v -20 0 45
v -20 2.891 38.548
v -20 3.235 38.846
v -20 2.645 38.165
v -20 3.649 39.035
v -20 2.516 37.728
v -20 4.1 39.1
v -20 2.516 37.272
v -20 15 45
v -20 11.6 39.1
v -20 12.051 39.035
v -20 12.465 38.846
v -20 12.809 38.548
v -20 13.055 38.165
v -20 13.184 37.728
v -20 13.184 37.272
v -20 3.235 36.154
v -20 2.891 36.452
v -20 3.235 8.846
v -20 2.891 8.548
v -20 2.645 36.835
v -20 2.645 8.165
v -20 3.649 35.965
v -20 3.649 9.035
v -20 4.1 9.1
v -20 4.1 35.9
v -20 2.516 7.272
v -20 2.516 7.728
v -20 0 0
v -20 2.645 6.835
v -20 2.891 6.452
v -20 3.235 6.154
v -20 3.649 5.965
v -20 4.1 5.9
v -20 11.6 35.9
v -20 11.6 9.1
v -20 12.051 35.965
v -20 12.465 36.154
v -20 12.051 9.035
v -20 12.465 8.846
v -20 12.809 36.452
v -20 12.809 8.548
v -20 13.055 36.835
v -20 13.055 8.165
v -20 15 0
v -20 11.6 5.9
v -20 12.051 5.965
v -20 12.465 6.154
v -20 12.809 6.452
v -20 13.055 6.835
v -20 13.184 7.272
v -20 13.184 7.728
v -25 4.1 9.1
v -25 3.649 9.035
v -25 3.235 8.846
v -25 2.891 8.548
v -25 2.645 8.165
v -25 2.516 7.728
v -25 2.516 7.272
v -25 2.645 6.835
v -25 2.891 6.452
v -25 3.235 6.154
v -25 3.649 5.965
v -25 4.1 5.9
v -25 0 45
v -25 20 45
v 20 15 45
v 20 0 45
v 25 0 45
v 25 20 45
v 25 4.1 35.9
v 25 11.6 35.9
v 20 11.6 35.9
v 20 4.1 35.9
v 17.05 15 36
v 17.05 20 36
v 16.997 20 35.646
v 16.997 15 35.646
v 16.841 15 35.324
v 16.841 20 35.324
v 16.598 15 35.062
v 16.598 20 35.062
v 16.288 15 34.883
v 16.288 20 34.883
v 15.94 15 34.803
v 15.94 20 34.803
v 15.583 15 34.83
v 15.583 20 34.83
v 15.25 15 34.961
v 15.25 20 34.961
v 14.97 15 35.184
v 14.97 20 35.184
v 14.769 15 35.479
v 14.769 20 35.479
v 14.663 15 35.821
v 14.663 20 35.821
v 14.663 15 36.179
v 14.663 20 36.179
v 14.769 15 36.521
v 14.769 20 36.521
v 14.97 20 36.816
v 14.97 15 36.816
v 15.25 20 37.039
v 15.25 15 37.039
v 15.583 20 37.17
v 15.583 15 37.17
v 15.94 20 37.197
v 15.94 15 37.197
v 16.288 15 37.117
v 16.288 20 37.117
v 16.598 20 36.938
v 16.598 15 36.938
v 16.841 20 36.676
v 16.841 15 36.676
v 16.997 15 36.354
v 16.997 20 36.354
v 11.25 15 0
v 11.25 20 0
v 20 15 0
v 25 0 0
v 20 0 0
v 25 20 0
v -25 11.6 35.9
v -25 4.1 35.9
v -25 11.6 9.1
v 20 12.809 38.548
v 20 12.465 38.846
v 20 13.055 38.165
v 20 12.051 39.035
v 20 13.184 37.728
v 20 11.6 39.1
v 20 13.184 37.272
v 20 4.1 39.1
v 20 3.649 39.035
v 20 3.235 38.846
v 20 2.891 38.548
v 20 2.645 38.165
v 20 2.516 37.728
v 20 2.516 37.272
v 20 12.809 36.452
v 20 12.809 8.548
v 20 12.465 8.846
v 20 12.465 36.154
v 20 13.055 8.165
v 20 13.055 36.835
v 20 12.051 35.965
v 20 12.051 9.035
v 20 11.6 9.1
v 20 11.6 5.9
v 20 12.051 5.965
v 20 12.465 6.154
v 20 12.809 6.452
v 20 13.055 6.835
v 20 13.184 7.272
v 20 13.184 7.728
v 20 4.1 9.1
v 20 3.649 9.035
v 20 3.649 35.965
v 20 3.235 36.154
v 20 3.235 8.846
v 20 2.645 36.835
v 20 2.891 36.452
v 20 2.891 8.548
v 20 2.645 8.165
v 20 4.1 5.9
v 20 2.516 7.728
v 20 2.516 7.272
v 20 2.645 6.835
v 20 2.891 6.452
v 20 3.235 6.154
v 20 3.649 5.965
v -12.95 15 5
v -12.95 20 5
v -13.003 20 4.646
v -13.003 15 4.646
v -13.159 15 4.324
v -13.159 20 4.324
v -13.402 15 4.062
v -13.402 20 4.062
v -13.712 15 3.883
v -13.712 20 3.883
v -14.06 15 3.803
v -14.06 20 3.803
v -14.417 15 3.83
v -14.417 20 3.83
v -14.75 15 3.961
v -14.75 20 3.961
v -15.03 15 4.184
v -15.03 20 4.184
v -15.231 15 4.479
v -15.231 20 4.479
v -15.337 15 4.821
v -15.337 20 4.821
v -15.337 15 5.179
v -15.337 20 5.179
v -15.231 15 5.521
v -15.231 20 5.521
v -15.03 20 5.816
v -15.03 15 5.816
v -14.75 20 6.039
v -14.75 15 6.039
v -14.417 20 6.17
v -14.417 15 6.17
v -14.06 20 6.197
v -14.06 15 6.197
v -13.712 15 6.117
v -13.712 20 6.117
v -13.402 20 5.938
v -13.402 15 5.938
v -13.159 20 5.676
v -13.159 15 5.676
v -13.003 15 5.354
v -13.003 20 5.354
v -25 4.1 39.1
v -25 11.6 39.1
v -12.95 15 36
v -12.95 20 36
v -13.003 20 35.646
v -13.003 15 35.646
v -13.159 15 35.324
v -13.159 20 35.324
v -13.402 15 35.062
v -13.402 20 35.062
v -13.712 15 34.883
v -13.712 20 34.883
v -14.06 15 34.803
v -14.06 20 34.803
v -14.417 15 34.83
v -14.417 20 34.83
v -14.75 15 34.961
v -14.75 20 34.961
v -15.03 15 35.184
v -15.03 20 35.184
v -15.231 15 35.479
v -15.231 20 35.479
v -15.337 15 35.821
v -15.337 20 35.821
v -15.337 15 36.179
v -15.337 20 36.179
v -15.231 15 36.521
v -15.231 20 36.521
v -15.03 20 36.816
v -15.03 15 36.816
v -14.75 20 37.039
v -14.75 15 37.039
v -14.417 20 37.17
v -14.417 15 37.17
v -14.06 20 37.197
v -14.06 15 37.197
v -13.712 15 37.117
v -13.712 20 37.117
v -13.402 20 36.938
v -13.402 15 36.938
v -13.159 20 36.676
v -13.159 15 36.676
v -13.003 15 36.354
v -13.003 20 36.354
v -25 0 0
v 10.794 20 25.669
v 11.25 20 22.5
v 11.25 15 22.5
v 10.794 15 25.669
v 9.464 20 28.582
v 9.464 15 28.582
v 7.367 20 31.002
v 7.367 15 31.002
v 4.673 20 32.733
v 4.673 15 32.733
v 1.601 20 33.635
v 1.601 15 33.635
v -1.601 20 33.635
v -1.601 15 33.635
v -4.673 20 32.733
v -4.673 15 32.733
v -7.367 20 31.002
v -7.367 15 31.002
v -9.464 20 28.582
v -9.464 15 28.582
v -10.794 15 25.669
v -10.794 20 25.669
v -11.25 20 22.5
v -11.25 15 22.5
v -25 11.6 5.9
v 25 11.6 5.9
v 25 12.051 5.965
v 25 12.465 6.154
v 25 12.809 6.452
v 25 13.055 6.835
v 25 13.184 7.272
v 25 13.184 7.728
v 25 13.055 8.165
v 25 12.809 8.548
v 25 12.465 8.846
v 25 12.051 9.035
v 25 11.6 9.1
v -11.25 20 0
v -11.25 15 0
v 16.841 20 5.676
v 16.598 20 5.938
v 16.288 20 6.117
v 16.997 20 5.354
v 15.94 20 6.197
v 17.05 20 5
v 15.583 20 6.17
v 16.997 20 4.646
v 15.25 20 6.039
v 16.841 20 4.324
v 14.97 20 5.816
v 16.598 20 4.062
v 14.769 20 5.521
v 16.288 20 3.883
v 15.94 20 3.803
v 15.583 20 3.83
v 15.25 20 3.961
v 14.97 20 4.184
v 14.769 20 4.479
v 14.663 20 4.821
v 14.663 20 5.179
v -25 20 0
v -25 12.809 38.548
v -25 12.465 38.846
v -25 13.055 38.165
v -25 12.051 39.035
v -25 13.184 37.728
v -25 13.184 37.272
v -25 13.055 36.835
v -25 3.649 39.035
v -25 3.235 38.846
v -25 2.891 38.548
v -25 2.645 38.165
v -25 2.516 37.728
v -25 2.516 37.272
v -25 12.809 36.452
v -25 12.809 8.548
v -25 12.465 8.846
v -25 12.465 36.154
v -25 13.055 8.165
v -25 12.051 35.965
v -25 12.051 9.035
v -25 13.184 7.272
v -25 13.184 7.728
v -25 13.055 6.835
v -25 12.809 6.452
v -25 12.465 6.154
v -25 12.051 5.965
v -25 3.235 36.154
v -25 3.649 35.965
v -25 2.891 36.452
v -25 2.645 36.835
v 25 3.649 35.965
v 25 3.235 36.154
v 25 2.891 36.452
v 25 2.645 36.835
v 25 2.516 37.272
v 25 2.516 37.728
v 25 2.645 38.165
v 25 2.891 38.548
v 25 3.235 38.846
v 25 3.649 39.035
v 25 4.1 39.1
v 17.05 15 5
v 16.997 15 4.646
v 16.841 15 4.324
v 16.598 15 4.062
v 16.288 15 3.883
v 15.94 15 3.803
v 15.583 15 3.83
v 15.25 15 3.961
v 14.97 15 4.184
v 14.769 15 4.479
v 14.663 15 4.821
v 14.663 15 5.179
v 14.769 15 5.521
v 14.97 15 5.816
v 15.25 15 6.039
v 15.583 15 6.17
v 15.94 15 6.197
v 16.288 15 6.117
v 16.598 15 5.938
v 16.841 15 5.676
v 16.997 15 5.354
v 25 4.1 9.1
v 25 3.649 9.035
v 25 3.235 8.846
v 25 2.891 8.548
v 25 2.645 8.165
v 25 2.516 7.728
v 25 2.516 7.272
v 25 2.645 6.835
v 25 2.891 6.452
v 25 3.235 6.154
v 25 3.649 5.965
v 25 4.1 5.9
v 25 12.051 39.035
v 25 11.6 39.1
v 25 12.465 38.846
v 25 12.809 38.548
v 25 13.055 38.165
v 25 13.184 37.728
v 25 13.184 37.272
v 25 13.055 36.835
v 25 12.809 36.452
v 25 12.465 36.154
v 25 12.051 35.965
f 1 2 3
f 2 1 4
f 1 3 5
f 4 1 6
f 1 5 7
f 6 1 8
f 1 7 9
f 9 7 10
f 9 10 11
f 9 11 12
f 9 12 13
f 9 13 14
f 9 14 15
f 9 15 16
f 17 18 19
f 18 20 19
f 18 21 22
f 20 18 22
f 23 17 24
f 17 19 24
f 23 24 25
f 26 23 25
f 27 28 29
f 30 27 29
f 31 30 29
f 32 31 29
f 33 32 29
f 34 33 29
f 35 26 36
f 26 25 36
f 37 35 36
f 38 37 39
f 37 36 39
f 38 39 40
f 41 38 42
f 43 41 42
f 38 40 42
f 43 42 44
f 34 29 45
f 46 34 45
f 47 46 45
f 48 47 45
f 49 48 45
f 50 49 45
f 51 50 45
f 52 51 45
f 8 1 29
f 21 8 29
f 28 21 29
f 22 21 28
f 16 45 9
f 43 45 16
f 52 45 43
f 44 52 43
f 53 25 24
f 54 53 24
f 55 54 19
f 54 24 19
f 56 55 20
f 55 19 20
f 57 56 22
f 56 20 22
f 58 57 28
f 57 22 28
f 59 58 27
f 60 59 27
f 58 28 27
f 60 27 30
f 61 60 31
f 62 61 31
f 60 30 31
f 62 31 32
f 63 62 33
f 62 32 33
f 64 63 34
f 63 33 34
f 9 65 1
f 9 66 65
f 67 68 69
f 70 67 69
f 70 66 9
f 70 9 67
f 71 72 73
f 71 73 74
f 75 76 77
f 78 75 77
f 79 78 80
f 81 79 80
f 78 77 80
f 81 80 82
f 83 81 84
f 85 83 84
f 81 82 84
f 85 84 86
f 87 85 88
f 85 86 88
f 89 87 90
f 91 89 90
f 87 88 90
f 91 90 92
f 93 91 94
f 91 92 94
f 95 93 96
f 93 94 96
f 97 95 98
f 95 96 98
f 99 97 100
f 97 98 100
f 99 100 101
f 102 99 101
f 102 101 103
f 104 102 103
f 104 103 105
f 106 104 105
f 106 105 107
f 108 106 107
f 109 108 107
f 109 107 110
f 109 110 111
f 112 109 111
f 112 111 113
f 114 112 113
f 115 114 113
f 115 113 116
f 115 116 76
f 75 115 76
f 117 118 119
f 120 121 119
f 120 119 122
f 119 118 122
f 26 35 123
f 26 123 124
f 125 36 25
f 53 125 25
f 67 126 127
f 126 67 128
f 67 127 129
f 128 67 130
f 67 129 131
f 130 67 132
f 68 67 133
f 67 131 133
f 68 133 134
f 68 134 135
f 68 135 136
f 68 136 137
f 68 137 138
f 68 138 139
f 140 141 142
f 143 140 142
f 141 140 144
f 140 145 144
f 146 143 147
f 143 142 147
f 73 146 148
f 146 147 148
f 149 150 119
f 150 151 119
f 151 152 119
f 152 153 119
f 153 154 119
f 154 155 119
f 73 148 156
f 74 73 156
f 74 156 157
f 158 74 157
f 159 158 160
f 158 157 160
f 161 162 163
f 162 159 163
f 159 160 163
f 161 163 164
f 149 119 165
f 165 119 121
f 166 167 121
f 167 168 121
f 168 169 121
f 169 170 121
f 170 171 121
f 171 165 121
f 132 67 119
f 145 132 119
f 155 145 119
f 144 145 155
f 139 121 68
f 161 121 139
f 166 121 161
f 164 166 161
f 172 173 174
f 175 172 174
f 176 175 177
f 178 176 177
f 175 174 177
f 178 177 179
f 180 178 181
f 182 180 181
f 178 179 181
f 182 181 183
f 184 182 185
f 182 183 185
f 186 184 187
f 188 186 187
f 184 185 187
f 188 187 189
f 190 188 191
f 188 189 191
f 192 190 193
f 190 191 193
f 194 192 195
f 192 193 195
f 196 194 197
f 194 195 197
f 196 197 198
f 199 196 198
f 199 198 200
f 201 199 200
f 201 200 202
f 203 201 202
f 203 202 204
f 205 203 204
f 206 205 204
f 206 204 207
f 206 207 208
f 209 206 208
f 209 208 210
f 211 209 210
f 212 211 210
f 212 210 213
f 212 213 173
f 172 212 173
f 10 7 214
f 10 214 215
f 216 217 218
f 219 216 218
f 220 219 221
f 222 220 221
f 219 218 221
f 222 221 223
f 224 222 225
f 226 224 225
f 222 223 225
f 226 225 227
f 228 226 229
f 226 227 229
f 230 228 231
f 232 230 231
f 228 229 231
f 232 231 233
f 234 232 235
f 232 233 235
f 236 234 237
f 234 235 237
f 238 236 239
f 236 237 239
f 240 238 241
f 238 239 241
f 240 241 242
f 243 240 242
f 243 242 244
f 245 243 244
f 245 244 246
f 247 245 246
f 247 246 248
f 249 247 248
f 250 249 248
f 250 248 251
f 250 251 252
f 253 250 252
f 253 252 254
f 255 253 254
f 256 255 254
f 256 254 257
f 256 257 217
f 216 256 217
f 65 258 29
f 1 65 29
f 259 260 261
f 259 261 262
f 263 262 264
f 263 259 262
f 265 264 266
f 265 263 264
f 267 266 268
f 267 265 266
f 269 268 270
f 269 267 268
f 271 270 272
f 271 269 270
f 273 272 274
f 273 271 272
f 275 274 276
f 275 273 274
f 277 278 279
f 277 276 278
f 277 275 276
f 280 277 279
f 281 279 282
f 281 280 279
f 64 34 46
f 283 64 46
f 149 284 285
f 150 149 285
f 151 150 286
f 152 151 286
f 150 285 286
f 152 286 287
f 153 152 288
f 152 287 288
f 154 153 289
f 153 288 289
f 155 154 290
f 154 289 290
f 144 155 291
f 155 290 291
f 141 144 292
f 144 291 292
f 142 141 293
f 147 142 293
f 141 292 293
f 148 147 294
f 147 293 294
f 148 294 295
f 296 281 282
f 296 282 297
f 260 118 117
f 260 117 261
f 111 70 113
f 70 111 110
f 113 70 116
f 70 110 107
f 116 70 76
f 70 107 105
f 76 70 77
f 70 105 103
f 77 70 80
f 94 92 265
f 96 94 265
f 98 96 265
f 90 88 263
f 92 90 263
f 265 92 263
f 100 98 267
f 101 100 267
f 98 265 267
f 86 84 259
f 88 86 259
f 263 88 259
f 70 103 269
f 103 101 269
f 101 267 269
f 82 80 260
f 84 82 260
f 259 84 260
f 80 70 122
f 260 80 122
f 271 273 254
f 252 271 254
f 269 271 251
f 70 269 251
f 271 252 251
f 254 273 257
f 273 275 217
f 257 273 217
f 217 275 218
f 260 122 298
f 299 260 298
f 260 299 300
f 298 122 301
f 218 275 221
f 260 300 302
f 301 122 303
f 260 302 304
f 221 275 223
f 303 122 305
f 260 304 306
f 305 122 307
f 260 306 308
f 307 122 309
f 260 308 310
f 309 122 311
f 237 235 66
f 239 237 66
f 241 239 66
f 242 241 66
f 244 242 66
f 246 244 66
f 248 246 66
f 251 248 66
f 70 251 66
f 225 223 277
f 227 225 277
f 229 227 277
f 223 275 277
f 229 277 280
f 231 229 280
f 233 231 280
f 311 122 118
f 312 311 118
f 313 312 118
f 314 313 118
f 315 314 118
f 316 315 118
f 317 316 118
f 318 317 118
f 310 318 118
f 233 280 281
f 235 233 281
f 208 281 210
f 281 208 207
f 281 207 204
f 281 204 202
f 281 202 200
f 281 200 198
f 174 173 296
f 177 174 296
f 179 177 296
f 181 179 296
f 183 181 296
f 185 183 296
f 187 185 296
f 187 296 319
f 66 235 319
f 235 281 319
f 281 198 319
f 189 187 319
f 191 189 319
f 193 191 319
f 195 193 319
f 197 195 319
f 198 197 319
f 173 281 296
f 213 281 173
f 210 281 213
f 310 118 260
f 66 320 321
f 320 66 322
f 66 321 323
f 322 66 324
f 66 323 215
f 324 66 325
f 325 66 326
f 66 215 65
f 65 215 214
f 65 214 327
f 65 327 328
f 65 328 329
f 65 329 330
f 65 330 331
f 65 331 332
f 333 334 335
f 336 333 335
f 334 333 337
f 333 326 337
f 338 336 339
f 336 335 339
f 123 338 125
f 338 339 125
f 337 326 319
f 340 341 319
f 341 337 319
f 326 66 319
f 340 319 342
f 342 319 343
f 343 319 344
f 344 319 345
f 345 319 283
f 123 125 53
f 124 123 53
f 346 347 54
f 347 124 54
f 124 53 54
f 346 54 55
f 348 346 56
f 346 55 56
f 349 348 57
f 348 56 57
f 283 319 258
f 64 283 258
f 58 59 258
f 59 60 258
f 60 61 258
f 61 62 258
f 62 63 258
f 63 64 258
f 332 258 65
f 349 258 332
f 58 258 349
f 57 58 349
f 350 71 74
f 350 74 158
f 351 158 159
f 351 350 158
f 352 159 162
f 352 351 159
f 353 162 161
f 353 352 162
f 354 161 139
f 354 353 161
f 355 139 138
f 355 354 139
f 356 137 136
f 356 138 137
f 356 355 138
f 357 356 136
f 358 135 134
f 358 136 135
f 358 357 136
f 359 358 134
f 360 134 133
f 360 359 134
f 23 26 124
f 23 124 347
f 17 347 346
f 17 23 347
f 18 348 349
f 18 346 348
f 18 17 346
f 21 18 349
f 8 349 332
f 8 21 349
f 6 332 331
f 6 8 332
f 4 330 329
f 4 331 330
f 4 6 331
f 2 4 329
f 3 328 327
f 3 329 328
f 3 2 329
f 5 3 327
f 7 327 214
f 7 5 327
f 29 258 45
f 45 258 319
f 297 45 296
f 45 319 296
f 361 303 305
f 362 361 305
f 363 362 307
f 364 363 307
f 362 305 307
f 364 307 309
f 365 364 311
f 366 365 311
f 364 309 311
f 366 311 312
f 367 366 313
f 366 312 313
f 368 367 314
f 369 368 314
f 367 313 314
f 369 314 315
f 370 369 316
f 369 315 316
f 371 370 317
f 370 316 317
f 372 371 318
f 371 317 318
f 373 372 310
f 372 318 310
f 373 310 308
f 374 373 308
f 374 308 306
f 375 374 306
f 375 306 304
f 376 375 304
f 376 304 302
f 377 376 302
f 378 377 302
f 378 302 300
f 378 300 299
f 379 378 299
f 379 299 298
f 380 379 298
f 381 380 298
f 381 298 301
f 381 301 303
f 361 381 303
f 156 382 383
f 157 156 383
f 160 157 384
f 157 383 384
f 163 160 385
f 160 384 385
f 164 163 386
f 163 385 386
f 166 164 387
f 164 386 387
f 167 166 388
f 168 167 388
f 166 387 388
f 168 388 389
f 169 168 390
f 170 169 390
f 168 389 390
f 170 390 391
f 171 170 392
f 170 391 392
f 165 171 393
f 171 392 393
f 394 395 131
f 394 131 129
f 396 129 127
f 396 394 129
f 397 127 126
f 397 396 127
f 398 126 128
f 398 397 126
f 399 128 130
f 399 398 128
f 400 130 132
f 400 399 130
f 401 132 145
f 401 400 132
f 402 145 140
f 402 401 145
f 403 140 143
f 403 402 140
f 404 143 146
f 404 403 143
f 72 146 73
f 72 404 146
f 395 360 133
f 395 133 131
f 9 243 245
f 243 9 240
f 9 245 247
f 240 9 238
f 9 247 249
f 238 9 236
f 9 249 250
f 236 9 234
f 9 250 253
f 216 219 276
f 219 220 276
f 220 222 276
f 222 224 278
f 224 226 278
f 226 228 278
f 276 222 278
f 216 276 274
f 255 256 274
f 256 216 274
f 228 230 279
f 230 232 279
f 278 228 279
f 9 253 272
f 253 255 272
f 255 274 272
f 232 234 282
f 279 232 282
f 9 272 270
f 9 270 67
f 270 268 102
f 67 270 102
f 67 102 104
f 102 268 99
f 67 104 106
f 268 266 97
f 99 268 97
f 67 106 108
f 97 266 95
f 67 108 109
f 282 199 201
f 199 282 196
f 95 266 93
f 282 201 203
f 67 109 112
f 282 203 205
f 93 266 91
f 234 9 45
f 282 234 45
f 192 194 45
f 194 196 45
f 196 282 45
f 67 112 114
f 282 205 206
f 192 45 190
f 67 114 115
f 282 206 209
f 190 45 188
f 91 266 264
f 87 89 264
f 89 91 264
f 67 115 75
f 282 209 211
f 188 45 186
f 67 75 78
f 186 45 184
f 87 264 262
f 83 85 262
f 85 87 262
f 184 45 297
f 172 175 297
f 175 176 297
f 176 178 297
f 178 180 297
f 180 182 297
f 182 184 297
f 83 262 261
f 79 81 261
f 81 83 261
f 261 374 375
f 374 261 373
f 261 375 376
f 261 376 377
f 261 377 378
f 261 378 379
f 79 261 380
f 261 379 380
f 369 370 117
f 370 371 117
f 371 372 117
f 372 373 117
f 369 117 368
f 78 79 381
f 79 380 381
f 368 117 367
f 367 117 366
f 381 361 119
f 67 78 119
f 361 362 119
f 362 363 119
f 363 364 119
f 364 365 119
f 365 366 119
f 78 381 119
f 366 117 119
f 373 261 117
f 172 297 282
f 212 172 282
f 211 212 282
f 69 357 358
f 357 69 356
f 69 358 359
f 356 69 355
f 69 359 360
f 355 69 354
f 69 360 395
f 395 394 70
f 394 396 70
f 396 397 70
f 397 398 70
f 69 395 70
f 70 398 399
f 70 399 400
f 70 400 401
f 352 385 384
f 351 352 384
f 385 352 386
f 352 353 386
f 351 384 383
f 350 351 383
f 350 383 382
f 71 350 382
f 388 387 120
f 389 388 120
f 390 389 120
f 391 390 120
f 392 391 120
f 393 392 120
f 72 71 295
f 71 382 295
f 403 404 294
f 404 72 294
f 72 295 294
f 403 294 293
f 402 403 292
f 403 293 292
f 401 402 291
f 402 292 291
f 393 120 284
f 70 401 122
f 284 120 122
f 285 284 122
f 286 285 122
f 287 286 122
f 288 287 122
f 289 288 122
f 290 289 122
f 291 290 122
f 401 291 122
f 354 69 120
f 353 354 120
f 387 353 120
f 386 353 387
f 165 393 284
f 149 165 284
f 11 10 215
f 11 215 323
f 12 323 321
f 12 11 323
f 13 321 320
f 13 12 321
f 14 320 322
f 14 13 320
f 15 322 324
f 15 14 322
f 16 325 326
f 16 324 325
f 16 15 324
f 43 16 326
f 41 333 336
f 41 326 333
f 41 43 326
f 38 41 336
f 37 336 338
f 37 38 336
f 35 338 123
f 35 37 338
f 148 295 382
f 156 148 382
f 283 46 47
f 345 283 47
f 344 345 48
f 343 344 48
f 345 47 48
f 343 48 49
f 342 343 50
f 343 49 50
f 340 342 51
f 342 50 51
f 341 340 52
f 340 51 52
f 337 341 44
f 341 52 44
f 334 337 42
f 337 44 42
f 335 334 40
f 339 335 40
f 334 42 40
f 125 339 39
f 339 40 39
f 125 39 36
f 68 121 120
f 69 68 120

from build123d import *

# Parameters (mm, degrees)
BOSS_EXTRUDE1_DEPTH     = 45
CUT_EXTRUDE1_REACH      = 22
SKETCH3_R               = 1.2
CUT_EXTRUDE2_DEPTH      = 10
CUT_EXTRUDE3_DEPTH      = 1
CUT_EXTRUDE3_DEPTH_BACK = 51


with BuildPart() as part:
    # Sketch1 → Boss-Extrude1 (new body)
    with BuildSketch(Plane.XY):
        Polygon((-25, 0), (-20, 0), (-20, 15), (20, 15), (20, 0), (25, 0), (25, 20), (-25, 20), align=None)
    extrude(amount=BOSS_EXTRUDE1_DEPTH)

    # Sketch2 → Cut-Extrude1 (cut, up to next)
    with BuildSketch(Plane(origin=(0, 20, 0), x_dir=(1, 0, 0), z_dir=(0, 1, 0)), mode=Mode.PRIVATE) as cut_extrude1_sk1:
        with BuildLine():
            Line((11.25, 0), (11.25, -22.5))
            ThreePointArc((11.25, -22.5), (0, -33.75), (-11.25, -22.5))
            Line((-11.25, -22.5), (-11.25, 0))
            Line((-11.25, 0), (11.25, 0))
        make_face()
    cut_extrude1_tool1 = extrude(cut_extrude1_sk1.sketch, amount=-CUT_EXTRUDE1_REACH, mode=Mode.PRIVATE) & part.part
    add(cut_extrude1_tool1.solids().sort_by_distance((0, 20, 15.768467))[0], mode=Mode.SUBTRACT)

    # Sketch3 → Cut-Extrude2 (cut)
    with BuildSketch(Plane(origin=(0, 20, 0), x_dir=(1, 0, 0), z_dir=(0, 1, 0))):
        with Locations((15.85, -36)):
            Circle(SKETCH3_R)
        with Locations((-14.15, -36)):
            Circle(SKETCH3_R)
        with Locations((-14.15, -5)):
            Circle(SKETCH3_R)
        with Locations((15.85, -5)):
            Circle(SKETCH3_R)
    extrude(amount=-CUT_EXTRUDE2_DEPTH, mode=Mode.SUBTRACT)

    # Sketch4 → Cut-Extrude3 (cut, two sides)
    with BuildSketch(Plane(origin=(25, 0, 0), x_dir=(0, 0, -1), z_dir=(1, 0, 0))) as cut_extrude3_sk:
        with BuildLine():
            Line((-35.9, 11.6), (-35.9, 4.1))
            ThreePointArc((-35.9, 4.1), (-37.5, 2.5), (-39.1, 4.1))
            Line((-39.1, 4.1), (-39.1, 11.6))
            ThreePointArc((-39.1, 11.6), (-37.5, 13.2), (-35.9, 11.6))
        make_face()
        with BuildLine():
            Line((-9.1, 11.6), (-9.1, 4.1))
            ThreePointArc((-9.1, 4.1), (-7.5, 2.5), (-5.9, 4.1))
            Line((-5.9, 4.1), (-5.9, 11.6))
            ThreePointArc((-5.9, 11.6), (-7.5, 13.2), (-9.1, 11.6))
        make_face()
    extrude(amount=CUT_EXTRUDE3_DEPTH, mode=Mode.SUBTRACT)
    extrude(cut_extrude3_sk.sketch, amount=-CUT_EXTRUDE3_DEPTH_BACK, mode=Mode.SUBTRACT)


solid = part.part
